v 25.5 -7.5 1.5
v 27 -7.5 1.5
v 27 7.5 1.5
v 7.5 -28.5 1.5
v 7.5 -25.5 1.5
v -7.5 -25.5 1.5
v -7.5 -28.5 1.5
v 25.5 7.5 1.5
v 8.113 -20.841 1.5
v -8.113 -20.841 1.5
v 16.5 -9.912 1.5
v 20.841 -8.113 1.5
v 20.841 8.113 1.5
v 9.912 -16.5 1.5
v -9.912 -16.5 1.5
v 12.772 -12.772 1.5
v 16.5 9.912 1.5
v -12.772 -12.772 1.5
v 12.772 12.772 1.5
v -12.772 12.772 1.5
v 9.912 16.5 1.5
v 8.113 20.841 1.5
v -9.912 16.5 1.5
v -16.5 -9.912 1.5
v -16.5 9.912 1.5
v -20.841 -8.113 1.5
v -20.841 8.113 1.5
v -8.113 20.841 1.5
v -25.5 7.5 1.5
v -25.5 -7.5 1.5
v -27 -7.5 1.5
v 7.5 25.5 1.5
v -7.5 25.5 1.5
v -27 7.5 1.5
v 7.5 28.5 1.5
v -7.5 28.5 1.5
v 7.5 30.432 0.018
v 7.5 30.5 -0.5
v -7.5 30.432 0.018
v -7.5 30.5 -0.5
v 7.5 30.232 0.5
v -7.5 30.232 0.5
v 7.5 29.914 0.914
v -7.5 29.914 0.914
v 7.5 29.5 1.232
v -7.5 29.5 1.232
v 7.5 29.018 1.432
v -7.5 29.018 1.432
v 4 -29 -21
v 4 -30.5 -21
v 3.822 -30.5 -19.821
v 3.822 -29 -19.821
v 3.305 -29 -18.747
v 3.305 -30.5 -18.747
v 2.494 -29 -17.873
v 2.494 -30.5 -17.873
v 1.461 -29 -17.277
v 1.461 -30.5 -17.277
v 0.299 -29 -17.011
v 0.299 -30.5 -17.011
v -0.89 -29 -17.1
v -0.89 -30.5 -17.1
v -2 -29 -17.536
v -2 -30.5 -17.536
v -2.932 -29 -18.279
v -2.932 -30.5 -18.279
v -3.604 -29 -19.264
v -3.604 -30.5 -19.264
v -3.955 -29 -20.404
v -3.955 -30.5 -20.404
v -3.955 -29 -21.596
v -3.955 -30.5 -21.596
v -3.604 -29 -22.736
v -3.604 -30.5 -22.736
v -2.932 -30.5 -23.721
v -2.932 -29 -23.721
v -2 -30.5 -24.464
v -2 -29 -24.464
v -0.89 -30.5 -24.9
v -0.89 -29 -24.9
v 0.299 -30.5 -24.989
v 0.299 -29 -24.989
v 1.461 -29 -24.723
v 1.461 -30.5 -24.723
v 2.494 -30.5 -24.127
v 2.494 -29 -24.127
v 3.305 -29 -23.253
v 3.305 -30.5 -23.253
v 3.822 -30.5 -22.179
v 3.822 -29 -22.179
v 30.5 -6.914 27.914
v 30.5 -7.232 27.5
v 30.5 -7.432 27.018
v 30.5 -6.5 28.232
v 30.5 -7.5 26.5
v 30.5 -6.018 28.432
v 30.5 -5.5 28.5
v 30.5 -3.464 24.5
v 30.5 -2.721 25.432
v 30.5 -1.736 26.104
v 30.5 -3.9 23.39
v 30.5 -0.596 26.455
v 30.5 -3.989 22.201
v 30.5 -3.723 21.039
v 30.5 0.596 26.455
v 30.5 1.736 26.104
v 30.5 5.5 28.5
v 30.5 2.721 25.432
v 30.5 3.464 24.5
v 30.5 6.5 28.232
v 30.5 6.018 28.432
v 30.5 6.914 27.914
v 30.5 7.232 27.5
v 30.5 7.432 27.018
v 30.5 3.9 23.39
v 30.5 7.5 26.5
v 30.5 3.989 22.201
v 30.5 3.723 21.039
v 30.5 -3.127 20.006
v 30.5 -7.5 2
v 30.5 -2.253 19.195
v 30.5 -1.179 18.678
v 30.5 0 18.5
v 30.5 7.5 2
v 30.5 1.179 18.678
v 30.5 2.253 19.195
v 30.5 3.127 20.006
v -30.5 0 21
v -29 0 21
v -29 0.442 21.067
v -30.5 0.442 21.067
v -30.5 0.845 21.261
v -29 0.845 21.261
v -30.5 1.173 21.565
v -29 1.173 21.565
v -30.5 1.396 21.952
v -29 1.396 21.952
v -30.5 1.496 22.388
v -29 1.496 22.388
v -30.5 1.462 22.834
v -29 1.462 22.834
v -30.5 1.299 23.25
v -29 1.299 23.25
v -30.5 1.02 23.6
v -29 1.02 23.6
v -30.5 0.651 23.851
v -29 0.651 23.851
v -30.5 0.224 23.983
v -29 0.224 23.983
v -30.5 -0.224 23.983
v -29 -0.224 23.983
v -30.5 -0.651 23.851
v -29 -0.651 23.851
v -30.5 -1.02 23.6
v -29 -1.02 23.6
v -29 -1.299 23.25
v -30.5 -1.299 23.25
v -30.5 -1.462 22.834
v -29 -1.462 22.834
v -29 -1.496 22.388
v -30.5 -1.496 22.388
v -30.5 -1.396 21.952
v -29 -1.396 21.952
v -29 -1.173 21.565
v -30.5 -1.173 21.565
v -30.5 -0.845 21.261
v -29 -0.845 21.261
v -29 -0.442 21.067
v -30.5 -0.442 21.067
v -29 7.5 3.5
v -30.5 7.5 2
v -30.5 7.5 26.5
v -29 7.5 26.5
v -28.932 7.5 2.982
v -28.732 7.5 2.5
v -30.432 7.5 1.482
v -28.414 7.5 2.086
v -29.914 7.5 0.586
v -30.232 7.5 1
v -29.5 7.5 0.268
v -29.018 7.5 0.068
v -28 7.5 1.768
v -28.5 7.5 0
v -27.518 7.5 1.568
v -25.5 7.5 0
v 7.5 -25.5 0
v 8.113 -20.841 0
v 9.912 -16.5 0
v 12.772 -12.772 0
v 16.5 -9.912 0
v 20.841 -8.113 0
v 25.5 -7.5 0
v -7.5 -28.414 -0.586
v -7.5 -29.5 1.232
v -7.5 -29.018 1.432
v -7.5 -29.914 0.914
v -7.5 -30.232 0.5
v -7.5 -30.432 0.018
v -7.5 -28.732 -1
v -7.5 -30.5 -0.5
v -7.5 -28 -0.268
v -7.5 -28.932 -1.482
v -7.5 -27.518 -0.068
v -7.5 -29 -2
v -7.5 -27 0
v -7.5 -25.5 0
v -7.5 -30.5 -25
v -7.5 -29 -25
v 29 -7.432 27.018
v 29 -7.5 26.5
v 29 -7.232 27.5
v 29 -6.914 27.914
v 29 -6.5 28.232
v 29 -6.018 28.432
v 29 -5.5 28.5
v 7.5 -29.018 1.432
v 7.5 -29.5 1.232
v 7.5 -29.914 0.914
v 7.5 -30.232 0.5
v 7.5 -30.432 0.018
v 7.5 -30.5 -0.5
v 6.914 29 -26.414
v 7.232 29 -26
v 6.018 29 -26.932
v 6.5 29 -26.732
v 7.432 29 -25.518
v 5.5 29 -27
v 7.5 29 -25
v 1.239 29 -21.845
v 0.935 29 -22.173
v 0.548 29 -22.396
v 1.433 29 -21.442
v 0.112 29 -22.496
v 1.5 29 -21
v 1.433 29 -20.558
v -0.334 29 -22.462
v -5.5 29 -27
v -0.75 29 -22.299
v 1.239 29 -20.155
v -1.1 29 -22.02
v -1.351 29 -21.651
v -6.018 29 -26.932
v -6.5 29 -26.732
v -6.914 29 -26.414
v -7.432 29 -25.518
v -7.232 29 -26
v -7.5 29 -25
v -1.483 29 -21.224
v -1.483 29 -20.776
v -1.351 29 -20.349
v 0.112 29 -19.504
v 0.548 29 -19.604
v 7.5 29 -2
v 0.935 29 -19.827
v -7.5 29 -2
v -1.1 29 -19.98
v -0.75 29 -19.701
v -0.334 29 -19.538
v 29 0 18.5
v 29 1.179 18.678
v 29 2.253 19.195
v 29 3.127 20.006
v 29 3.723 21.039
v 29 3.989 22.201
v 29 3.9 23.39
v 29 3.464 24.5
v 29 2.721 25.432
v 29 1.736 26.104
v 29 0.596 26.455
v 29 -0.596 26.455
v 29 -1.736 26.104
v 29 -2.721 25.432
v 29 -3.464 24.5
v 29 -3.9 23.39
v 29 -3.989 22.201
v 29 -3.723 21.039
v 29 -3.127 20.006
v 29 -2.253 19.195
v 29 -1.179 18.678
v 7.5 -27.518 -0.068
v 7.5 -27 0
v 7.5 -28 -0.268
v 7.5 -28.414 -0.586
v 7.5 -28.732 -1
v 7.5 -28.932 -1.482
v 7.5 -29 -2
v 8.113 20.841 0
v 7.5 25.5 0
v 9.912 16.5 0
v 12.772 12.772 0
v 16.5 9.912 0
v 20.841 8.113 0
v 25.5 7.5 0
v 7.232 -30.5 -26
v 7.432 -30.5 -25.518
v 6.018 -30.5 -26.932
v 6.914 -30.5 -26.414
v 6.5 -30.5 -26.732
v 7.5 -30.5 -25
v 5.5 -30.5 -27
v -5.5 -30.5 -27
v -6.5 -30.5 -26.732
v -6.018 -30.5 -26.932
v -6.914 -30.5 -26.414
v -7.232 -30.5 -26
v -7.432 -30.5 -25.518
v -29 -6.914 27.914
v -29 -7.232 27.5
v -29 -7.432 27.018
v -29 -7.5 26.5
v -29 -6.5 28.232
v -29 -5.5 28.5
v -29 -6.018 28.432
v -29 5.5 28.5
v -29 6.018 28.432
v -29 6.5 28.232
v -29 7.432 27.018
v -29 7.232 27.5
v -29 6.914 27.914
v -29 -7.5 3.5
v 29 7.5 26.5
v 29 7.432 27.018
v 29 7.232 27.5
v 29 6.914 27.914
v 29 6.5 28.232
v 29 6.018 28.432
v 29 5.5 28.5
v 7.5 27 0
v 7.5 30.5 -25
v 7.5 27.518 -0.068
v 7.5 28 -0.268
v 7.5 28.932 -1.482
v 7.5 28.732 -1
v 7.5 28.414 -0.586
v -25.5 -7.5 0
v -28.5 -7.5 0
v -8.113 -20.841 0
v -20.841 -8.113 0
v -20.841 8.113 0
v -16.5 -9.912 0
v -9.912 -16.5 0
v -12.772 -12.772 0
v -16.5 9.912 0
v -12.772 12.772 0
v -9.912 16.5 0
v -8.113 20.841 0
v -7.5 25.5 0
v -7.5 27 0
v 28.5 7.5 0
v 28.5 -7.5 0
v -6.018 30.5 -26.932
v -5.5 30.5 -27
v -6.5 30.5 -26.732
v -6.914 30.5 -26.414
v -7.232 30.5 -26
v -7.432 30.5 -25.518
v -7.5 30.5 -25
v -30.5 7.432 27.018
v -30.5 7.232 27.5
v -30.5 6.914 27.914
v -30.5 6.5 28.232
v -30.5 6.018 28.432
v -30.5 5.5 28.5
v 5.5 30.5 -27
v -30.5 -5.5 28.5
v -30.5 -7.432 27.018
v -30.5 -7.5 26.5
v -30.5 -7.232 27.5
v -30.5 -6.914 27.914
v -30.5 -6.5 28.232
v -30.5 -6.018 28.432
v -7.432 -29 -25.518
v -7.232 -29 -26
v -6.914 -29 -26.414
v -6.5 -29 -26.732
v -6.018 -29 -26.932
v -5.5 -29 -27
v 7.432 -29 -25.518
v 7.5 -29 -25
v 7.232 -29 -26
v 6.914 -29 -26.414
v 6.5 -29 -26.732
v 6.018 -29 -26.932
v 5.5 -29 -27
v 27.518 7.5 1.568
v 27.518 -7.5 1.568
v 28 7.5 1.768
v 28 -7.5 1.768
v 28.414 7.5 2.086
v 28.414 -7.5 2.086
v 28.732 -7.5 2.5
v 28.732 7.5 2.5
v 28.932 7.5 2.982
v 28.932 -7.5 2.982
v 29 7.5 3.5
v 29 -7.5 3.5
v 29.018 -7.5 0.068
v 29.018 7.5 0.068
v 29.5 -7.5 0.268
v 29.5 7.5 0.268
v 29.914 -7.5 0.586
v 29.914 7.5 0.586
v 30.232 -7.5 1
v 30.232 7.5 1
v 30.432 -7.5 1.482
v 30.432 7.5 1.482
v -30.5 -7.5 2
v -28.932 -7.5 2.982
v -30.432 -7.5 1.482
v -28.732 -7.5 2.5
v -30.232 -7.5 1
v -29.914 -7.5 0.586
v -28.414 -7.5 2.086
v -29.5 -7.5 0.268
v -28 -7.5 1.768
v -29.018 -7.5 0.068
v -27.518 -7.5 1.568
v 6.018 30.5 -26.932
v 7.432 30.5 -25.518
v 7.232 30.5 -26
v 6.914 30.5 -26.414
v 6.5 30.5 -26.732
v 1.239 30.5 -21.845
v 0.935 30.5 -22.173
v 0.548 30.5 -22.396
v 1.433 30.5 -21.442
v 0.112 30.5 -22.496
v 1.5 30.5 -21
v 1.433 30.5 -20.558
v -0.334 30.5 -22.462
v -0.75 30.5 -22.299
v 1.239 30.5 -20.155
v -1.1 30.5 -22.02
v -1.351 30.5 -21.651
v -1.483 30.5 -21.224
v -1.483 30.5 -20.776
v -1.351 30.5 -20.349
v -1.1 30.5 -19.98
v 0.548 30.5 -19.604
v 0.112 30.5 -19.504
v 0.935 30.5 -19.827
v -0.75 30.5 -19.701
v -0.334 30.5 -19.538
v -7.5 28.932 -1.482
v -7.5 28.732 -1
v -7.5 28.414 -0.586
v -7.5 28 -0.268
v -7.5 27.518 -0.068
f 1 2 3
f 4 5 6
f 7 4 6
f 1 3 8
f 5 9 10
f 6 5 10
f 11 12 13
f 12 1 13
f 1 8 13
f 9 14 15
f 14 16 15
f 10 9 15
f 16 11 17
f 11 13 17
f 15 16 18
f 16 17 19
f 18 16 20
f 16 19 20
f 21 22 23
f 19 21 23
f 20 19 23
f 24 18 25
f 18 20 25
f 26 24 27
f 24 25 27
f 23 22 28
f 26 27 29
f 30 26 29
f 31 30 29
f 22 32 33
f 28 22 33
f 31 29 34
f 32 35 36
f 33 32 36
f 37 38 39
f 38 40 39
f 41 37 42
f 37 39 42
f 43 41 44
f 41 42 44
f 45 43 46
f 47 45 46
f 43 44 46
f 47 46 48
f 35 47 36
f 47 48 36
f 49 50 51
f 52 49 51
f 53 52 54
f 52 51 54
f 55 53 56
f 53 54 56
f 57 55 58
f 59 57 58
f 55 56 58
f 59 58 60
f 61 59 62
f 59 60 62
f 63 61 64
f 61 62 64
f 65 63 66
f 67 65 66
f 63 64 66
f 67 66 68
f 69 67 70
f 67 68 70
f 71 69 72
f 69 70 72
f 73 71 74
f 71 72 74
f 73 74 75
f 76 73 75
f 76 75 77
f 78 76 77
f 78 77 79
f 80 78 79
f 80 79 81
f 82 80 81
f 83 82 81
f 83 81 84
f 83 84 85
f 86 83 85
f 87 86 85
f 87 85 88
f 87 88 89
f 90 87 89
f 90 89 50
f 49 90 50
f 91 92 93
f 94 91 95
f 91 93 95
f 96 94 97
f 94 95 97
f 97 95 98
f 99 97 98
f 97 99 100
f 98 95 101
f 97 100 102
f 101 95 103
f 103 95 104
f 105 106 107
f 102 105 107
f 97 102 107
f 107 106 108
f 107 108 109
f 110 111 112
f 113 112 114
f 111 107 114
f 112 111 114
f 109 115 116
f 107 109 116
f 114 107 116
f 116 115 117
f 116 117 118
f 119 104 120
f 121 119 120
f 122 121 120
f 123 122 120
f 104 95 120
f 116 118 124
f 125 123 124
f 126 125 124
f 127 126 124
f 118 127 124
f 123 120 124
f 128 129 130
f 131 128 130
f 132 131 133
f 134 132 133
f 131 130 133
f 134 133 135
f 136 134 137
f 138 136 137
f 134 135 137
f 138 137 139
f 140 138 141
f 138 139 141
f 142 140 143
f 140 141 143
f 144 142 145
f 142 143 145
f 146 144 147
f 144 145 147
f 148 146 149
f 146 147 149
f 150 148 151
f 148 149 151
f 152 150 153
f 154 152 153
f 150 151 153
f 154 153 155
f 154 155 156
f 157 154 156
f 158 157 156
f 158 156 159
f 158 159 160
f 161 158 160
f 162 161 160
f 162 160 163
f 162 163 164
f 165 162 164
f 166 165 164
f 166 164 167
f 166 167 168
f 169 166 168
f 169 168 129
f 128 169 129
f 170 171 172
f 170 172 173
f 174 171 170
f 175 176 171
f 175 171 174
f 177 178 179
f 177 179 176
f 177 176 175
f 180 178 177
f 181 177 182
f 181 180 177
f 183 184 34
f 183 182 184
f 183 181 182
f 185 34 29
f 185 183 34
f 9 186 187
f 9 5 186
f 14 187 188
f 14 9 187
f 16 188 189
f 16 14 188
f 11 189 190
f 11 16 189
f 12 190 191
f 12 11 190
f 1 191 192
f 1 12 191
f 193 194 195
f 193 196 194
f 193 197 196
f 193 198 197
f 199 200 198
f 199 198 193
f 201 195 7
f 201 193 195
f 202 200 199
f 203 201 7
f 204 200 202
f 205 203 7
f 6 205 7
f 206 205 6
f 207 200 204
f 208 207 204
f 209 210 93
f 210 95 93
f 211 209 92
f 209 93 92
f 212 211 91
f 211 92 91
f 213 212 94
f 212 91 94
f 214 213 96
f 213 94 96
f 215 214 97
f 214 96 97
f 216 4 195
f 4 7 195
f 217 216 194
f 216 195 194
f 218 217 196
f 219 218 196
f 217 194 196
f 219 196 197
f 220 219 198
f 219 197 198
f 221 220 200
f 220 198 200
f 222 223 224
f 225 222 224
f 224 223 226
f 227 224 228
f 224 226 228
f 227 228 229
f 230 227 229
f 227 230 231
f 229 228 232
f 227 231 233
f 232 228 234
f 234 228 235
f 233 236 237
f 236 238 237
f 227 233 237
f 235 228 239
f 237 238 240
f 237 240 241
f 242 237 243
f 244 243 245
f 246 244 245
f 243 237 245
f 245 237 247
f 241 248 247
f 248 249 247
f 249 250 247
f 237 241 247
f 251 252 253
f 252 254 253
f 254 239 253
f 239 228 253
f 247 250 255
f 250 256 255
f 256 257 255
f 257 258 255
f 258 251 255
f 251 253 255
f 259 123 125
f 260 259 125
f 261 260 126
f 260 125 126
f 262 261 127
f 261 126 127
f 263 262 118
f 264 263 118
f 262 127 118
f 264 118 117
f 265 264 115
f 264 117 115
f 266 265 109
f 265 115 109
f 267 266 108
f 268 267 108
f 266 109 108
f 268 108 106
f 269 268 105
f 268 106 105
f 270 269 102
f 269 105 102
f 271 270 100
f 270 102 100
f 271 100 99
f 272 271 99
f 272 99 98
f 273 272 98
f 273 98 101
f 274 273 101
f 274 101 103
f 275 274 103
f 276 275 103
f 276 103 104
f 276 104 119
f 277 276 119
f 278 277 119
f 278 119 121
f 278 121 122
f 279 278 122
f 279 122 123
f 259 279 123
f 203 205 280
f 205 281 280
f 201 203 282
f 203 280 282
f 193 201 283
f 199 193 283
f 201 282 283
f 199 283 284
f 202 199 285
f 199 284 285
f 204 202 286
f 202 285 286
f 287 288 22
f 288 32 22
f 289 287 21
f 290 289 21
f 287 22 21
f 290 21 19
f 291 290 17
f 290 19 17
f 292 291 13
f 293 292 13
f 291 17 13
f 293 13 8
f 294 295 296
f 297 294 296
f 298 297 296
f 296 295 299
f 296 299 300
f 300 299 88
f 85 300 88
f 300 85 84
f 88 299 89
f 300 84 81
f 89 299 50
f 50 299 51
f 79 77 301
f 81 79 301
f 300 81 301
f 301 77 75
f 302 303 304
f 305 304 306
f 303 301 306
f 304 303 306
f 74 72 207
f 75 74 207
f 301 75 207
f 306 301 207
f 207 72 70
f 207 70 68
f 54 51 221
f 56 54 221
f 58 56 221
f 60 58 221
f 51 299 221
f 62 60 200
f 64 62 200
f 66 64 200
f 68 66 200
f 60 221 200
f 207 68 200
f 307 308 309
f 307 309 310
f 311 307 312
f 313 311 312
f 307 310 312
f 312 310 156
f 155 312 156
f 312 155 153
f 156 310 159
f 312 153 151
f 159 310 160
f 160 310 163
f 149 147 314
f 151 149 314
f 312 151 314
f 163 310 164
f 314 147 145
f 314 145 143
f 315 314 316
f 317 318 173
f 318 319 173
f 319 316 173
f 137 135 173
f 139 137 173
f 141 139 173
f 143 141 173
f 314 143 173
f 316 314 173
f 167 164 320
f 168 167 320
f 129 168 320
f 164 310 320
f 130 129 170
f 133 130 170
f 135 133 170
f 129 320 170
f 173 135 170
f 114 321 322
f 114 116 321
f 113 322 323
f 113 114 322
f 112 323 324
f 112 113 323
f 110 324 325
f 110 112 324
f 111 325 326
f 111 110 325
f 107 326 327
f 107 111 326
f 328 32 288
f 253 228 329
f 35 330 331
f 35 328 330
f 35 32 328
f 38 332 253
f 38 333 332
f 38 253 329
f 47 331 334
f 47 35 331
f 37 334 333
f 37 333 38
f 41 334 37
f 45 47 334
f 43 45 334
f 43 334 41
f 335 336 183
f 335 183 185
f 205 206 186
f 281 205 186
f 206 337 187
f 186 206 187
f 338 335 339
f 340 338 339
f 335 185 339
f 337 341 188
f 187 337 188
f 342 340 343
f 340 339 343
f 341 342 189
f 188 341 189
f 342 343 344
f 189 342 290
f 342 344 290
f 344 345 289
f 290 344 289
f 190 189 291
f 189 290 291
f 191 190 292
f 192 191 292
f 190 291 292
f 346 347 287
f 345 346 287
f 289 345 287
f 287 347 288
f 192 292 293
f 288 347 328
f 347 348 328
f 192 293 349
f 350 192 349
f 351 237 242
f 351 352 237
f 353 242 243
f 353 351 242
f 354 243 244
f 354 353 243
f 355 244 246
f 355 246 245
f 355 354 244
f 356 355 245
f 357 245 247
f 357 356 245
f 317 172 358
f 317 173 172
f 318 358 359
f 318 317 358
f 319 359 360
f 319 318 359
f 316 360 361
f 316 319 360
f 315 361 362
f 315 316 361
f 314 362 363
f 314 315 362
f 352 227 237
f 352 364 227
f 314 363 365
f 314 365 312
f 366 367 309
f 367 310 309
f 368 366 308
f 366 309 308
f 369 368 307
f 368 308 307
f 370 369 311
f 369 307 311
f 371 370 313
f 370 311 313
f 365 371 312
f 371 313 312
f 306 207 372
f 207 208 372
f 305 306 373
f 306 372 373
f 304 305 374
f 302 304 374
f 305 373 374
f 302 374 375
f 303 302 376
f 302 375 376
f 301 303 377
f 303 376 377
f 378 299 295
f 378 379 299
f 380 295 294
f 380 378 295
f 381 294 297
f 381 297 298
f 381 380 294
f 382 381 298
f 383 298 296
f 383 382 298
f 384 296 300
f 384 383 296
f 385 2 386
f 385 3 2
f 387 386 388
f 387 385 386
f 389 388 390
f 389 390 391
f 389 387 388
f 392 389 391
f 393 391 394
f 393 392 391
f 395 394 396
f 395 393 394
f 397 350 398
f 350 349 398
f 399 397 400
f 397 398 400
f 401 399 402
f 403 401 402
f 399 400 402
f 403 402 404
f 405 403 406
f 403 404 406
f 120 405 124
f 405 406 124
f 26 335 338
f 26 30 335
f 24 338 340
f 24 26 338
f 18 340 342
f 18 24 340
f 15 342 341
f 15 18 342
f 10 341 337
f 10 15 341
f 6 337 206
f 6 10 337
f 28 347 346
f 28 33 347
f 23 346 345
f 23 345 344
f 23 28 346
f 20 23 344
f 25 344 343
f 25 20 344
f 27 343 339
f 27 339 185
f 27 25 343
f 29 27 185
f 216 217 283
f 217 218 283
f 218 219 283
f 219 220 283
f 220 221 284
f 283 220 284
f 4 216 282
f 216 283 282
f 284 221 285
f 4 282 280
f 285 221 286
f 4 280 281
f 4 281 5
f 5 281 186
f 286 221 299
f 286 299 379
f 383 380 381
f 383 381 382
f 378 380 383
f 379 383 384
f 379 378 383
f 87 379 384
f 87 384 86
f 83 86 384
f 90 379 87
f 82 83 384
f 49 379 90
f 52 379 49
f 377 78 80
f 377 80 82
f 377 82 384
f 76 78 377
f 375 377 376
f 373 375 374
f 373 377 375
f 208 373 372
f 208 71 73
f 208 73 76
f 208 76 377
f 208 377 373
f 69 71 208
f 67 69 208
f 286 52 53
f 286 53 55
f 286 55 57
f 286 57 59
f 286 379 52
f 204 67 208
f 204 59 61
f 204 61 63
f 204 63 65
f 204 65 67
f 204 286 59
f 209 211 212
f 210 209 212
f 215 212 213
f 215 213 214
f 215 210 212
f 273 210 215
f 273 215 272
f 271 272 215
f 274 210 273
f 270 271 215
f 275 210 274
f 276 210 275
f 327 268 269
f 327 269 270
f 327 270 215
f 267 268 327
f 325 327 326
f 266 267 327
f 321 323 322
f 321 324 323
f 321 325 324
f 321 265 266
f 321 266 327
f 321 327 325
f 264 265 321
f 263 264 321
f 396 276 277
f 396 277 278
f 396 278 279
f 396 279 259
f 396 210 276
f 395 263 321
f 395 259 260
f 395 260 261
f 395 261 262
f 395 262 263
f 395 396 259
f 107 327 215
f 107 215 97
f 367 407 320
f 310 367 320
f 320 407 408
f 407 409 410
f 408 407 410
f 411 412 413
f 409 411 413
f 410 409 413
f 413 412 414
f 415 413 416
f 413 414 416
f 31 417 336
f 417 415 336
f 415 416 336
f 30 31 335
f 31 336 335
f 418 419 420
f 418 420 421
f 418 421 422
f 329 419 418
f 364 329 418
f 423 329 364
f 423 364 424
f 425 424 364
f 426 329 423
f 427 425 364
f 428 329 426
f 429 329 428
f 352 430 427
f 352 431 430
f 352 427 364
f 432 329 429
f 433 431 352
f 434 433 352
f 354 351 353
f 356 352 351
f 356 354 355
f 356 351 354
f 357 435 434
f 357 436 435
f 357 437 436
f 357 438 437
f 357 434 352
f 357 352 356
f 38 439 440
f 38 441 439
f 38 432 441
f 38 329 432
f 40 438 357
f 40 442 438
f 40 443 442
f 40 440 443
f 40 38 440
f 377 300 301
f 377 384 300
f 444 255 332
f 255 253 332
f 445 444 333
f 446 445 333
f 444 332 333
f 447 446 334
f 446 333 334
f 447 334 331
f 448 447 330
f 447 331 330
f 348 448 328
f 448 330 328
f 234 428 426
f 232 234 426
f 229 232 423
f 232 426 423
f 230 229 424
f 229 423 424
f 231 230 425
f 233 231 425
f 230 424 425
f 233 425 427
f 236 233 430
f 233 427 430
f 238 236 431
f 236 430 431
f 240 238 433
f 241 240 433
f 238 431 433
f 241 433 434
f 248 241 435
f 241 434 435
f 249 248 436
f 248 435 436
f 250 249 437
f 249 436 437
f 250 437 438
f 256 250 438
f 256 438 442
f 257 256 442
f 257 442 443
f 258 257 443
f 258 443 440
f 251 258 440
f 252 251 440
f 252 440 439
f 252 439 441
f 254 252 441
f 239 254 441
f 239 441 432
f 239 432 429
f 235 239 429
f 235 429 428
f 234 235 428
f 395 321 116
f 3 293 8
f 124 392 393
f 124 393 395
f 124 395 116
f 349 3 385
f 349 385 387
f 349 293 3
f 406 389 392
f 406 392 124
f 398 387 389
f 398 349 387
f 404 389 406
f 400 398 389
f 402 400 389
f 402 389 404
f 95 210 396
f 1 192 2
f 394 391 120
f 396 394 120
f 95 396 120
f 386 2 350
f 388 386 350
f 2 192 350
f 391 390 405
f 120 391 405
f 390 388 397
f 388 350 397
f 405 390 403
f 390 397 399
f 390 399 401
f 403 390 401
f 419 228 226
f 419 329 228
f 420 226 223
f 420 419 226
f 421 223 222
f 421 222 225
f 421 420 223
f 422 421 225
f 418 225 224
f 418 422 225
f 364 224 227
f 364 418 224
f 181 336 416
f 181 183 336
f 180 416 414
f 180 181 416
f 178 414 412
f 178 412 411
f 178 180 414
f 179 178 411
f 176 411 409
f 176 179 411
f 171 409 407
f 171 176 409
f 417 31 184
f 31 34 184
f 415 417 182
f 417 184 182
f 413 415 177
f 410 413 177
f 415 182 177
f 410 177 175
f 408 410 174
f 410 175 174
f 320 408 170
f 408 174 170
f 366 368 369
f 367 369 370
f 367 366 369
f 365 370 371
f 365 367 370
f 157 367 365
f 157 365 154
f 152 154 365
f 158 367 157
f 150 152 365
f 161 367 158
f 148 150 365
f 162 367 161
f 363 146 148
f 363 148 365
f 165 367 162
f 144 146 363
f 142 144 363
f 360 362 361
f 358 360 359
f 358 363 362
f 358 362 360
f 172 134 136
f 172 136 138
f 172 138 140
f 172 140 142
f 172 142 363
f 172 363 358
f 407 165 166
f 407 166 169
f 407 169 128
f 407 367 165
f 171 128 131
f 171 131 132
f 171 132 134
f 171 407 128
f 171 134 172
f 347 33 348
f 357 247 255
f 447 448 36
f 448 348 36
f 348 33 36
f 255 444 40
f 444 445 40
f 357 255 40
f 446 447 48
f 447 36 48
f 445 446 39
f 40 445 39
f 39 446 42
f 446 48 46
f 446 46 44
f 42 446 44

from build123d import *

# Parameters (mm, degrees)
SKETCH1_W           = 15
SKETCH1_H           = 21.5
SKETCH1_W_2         = 21.5
SKETCH1_H_2         = 15
BOSS_EXTRUDE1_DEPTH = 1.5
BOSS_EXTRUDE2_START = -1.5
SKETCH2_W           = 1.5
SKETCH2_H           = 15
BOSS_EXTRUDE2_DEPTH = 28.5
BOSS_EXTRUDE3_START = -1.5
SKETCH3_W           = 15
SKETCH3_H           = 1.5
BOSS_EXTRUDE3_DEPTH = 28.5
SKETCH4_R           = 1.5
CUT_EXTRUDE1_DEPTH  = 62
SKETCH5_R           = 1.5
CUT_EXTRUDE2_DEPTH  = 62
FILLET1_R           = 2
FILLET2_R           = 2
FILLET3_R           = 18
CUT_EXTRUDE3_REACH  = 63
SKETCH6_R           = 4
CUT_EXTRUDE4_REACH  = 63
SKETCH7_R           = 4


with BuildPart() as part:
    # Sketch1 → Boss-Extrude1 (new body)
    with BuildSketch(Plane.XY):
        with Locations((0, 18.25)):
            Rectangle(SKETCH1_W, SKETCH1_H)
        with Locations((-18.25, 0)):
            Rectangle(SKETCH1_W_2, SKETCH1_H_2)
        Rectangle(SKETCH1_W, SKETCH1_H_2)
        with Locations((18.25, 0)):
            Rectangle(SKETCH1_W_2, SKETCH1_H_2)
        with Locations((0, -18.25)):
            Rectangle(SKETCH1_W, SKETCH1_H)
    extrude(amount=BOSS_EXTRUDE1_DEPTH)

    # Sketch2 → Boss-Extrude2 (add)
    with BuildSketch(Plane.XY.offset(1.5).offset(BOSS_EXTRUDE2_START)):
        with Locations((-29.75, 0)):
            Rectangle(SKETCH2_W, SKETCH2_H)
        with Locations((29.75, 0)):
            Rectangle(SKETCH2_W, SKETCH2_H)
    extrude(amount=BOSS_EXTRUDE2_DEPTH)

    # Sketch3 → Boss-Extrude3 (add)
    with BuildSketch(Plane(origin=(0, 0, 0), x_dir=(-1, 0, 0), z_dir=(0, 0, -1)).offset(BOSS_EXTRUDE3_START)):
        with Locations((0, 29.75)):
            Rectangle(SKETCH3_W, SKETCH3_H)
        with Locations((0, -29.75)):
            Rectangle(SKETCH3_W, SKETCH3_H)
    extrude(amount=BOSS_EXTRUDE3_DEPTH)

    # Sketch4 → Cut-Extrude1 (cut, through all)
    with BuildSketch(Plane(origin=(30.5, 0, 0), x_dir=(0, 0, -1), z_dir=(1, 0, 0))):
        with Locations((-22.5, 0)):
            Circle(SKETCH4_R)
    extrude(amount=-CUT_EXTRUDE1_DEPTH, mode=Mode.SUBTRACT)

    # Sketch5 → Cut-Extrude2 (cut, through all)
    with BuildSketch(Plane(origin=(0, 30.5, 0), x_dir=(1, 0, 0), z_dir=(0, 1, 0))):
        with Locations((0, 21)):
            Circle(SKETCH5_R)
    extrude(amount=-CUT_EXTRUDE2_DEPTH, mode=Mode.SUBTRACT)

    # Fillet1
    fillet1_edges = [part.edges().sort_by_distance(p)[0] for p in [
        (-7.5, -29.75, -27),
        (7.5, -29.75, -27),
        (-7.5, 29.75, -27),
        (7.5, 29.75, -27),
        (-29.75, 7.5, 28.5),
        (-29.75, -7.5, 28.5),
        (29.75, -7.5, 28.5),
        (29.75, 7.5, 28.5),
    ]]
    fillet(fillet1_edges, radius=FILLET1_R)

    # Fillet2
    fillet2_edges = [part.edges().sort_by_distance(p)[0] for p in [
        (29, 0, 1.5),
        (30.5, 0, 0),
        (-30.5, 0, 0),
        (-29, 0, 1.5),
        (0, 29, 0),
        (0, -29, 0),
        (0, -30.5, 1.5),
        (0, 30.5, 1.5),
    ]]
    fillet(fillet2_edges, radius=FILLET2_R)

    # Fillet3
    fillet3_edges = [part.edges().sort_by_distance(p)[0] for p in [
        (-7.5, 7.5, 0.75),
        (-7.5, -7.5, 0.75),
        (7.5, -7.5, 0.75),
        (7.5, 7.5, 0.75),
    ]]
    fillet(fillet3_edges, radius=FILLET3_R)

    # Sketch6 → Cut-Extrude3 (cut, up to next)
    with BuildSketch(Plane(origin=(30.5, 0, 0), x_dir=(0, 0, -1), z_dir=(1, 0, 0)), mode=Mode.PRIVATE) as cut_extrude3_sk1:
        with Locations((-22.5, 0)):
            Circle(SKETCH6_R)
    cut_extrude3_tool1 = extrude(cut_extrude3_sk1.sketch, amount=-CUT_EXTRUDE3_REACH, mode=Mode.PRIVATE) & part.part
    add(cut_extrude3_tool1.solids().sort_by_distance((30.5, 0, 22.5))[0], mode=Mode.SUBTRACT)

    # Sketch7 → Cut-Extrude4 (cut, up to next)
    with BuildSketch(Plane.XZ.offset(30.5), mode=Mode.PRIVATE) as cut_extrude4_sk1:
        with Locations((0, -21)):
            Circle(SKETCH7_R)
    cut_extrude4_tool1 = extrude(cut_extrude4_sk1.sketch, amount=-CUT_EXTRUDE4_REACH, mode=Mode.PRIVATE) & part.part
    add(cut_extrude4_tool1.solids().sort_by_distance((0, -30.5, -21))[0], mode=Mode.SUBTRACT)


solid = part.part
